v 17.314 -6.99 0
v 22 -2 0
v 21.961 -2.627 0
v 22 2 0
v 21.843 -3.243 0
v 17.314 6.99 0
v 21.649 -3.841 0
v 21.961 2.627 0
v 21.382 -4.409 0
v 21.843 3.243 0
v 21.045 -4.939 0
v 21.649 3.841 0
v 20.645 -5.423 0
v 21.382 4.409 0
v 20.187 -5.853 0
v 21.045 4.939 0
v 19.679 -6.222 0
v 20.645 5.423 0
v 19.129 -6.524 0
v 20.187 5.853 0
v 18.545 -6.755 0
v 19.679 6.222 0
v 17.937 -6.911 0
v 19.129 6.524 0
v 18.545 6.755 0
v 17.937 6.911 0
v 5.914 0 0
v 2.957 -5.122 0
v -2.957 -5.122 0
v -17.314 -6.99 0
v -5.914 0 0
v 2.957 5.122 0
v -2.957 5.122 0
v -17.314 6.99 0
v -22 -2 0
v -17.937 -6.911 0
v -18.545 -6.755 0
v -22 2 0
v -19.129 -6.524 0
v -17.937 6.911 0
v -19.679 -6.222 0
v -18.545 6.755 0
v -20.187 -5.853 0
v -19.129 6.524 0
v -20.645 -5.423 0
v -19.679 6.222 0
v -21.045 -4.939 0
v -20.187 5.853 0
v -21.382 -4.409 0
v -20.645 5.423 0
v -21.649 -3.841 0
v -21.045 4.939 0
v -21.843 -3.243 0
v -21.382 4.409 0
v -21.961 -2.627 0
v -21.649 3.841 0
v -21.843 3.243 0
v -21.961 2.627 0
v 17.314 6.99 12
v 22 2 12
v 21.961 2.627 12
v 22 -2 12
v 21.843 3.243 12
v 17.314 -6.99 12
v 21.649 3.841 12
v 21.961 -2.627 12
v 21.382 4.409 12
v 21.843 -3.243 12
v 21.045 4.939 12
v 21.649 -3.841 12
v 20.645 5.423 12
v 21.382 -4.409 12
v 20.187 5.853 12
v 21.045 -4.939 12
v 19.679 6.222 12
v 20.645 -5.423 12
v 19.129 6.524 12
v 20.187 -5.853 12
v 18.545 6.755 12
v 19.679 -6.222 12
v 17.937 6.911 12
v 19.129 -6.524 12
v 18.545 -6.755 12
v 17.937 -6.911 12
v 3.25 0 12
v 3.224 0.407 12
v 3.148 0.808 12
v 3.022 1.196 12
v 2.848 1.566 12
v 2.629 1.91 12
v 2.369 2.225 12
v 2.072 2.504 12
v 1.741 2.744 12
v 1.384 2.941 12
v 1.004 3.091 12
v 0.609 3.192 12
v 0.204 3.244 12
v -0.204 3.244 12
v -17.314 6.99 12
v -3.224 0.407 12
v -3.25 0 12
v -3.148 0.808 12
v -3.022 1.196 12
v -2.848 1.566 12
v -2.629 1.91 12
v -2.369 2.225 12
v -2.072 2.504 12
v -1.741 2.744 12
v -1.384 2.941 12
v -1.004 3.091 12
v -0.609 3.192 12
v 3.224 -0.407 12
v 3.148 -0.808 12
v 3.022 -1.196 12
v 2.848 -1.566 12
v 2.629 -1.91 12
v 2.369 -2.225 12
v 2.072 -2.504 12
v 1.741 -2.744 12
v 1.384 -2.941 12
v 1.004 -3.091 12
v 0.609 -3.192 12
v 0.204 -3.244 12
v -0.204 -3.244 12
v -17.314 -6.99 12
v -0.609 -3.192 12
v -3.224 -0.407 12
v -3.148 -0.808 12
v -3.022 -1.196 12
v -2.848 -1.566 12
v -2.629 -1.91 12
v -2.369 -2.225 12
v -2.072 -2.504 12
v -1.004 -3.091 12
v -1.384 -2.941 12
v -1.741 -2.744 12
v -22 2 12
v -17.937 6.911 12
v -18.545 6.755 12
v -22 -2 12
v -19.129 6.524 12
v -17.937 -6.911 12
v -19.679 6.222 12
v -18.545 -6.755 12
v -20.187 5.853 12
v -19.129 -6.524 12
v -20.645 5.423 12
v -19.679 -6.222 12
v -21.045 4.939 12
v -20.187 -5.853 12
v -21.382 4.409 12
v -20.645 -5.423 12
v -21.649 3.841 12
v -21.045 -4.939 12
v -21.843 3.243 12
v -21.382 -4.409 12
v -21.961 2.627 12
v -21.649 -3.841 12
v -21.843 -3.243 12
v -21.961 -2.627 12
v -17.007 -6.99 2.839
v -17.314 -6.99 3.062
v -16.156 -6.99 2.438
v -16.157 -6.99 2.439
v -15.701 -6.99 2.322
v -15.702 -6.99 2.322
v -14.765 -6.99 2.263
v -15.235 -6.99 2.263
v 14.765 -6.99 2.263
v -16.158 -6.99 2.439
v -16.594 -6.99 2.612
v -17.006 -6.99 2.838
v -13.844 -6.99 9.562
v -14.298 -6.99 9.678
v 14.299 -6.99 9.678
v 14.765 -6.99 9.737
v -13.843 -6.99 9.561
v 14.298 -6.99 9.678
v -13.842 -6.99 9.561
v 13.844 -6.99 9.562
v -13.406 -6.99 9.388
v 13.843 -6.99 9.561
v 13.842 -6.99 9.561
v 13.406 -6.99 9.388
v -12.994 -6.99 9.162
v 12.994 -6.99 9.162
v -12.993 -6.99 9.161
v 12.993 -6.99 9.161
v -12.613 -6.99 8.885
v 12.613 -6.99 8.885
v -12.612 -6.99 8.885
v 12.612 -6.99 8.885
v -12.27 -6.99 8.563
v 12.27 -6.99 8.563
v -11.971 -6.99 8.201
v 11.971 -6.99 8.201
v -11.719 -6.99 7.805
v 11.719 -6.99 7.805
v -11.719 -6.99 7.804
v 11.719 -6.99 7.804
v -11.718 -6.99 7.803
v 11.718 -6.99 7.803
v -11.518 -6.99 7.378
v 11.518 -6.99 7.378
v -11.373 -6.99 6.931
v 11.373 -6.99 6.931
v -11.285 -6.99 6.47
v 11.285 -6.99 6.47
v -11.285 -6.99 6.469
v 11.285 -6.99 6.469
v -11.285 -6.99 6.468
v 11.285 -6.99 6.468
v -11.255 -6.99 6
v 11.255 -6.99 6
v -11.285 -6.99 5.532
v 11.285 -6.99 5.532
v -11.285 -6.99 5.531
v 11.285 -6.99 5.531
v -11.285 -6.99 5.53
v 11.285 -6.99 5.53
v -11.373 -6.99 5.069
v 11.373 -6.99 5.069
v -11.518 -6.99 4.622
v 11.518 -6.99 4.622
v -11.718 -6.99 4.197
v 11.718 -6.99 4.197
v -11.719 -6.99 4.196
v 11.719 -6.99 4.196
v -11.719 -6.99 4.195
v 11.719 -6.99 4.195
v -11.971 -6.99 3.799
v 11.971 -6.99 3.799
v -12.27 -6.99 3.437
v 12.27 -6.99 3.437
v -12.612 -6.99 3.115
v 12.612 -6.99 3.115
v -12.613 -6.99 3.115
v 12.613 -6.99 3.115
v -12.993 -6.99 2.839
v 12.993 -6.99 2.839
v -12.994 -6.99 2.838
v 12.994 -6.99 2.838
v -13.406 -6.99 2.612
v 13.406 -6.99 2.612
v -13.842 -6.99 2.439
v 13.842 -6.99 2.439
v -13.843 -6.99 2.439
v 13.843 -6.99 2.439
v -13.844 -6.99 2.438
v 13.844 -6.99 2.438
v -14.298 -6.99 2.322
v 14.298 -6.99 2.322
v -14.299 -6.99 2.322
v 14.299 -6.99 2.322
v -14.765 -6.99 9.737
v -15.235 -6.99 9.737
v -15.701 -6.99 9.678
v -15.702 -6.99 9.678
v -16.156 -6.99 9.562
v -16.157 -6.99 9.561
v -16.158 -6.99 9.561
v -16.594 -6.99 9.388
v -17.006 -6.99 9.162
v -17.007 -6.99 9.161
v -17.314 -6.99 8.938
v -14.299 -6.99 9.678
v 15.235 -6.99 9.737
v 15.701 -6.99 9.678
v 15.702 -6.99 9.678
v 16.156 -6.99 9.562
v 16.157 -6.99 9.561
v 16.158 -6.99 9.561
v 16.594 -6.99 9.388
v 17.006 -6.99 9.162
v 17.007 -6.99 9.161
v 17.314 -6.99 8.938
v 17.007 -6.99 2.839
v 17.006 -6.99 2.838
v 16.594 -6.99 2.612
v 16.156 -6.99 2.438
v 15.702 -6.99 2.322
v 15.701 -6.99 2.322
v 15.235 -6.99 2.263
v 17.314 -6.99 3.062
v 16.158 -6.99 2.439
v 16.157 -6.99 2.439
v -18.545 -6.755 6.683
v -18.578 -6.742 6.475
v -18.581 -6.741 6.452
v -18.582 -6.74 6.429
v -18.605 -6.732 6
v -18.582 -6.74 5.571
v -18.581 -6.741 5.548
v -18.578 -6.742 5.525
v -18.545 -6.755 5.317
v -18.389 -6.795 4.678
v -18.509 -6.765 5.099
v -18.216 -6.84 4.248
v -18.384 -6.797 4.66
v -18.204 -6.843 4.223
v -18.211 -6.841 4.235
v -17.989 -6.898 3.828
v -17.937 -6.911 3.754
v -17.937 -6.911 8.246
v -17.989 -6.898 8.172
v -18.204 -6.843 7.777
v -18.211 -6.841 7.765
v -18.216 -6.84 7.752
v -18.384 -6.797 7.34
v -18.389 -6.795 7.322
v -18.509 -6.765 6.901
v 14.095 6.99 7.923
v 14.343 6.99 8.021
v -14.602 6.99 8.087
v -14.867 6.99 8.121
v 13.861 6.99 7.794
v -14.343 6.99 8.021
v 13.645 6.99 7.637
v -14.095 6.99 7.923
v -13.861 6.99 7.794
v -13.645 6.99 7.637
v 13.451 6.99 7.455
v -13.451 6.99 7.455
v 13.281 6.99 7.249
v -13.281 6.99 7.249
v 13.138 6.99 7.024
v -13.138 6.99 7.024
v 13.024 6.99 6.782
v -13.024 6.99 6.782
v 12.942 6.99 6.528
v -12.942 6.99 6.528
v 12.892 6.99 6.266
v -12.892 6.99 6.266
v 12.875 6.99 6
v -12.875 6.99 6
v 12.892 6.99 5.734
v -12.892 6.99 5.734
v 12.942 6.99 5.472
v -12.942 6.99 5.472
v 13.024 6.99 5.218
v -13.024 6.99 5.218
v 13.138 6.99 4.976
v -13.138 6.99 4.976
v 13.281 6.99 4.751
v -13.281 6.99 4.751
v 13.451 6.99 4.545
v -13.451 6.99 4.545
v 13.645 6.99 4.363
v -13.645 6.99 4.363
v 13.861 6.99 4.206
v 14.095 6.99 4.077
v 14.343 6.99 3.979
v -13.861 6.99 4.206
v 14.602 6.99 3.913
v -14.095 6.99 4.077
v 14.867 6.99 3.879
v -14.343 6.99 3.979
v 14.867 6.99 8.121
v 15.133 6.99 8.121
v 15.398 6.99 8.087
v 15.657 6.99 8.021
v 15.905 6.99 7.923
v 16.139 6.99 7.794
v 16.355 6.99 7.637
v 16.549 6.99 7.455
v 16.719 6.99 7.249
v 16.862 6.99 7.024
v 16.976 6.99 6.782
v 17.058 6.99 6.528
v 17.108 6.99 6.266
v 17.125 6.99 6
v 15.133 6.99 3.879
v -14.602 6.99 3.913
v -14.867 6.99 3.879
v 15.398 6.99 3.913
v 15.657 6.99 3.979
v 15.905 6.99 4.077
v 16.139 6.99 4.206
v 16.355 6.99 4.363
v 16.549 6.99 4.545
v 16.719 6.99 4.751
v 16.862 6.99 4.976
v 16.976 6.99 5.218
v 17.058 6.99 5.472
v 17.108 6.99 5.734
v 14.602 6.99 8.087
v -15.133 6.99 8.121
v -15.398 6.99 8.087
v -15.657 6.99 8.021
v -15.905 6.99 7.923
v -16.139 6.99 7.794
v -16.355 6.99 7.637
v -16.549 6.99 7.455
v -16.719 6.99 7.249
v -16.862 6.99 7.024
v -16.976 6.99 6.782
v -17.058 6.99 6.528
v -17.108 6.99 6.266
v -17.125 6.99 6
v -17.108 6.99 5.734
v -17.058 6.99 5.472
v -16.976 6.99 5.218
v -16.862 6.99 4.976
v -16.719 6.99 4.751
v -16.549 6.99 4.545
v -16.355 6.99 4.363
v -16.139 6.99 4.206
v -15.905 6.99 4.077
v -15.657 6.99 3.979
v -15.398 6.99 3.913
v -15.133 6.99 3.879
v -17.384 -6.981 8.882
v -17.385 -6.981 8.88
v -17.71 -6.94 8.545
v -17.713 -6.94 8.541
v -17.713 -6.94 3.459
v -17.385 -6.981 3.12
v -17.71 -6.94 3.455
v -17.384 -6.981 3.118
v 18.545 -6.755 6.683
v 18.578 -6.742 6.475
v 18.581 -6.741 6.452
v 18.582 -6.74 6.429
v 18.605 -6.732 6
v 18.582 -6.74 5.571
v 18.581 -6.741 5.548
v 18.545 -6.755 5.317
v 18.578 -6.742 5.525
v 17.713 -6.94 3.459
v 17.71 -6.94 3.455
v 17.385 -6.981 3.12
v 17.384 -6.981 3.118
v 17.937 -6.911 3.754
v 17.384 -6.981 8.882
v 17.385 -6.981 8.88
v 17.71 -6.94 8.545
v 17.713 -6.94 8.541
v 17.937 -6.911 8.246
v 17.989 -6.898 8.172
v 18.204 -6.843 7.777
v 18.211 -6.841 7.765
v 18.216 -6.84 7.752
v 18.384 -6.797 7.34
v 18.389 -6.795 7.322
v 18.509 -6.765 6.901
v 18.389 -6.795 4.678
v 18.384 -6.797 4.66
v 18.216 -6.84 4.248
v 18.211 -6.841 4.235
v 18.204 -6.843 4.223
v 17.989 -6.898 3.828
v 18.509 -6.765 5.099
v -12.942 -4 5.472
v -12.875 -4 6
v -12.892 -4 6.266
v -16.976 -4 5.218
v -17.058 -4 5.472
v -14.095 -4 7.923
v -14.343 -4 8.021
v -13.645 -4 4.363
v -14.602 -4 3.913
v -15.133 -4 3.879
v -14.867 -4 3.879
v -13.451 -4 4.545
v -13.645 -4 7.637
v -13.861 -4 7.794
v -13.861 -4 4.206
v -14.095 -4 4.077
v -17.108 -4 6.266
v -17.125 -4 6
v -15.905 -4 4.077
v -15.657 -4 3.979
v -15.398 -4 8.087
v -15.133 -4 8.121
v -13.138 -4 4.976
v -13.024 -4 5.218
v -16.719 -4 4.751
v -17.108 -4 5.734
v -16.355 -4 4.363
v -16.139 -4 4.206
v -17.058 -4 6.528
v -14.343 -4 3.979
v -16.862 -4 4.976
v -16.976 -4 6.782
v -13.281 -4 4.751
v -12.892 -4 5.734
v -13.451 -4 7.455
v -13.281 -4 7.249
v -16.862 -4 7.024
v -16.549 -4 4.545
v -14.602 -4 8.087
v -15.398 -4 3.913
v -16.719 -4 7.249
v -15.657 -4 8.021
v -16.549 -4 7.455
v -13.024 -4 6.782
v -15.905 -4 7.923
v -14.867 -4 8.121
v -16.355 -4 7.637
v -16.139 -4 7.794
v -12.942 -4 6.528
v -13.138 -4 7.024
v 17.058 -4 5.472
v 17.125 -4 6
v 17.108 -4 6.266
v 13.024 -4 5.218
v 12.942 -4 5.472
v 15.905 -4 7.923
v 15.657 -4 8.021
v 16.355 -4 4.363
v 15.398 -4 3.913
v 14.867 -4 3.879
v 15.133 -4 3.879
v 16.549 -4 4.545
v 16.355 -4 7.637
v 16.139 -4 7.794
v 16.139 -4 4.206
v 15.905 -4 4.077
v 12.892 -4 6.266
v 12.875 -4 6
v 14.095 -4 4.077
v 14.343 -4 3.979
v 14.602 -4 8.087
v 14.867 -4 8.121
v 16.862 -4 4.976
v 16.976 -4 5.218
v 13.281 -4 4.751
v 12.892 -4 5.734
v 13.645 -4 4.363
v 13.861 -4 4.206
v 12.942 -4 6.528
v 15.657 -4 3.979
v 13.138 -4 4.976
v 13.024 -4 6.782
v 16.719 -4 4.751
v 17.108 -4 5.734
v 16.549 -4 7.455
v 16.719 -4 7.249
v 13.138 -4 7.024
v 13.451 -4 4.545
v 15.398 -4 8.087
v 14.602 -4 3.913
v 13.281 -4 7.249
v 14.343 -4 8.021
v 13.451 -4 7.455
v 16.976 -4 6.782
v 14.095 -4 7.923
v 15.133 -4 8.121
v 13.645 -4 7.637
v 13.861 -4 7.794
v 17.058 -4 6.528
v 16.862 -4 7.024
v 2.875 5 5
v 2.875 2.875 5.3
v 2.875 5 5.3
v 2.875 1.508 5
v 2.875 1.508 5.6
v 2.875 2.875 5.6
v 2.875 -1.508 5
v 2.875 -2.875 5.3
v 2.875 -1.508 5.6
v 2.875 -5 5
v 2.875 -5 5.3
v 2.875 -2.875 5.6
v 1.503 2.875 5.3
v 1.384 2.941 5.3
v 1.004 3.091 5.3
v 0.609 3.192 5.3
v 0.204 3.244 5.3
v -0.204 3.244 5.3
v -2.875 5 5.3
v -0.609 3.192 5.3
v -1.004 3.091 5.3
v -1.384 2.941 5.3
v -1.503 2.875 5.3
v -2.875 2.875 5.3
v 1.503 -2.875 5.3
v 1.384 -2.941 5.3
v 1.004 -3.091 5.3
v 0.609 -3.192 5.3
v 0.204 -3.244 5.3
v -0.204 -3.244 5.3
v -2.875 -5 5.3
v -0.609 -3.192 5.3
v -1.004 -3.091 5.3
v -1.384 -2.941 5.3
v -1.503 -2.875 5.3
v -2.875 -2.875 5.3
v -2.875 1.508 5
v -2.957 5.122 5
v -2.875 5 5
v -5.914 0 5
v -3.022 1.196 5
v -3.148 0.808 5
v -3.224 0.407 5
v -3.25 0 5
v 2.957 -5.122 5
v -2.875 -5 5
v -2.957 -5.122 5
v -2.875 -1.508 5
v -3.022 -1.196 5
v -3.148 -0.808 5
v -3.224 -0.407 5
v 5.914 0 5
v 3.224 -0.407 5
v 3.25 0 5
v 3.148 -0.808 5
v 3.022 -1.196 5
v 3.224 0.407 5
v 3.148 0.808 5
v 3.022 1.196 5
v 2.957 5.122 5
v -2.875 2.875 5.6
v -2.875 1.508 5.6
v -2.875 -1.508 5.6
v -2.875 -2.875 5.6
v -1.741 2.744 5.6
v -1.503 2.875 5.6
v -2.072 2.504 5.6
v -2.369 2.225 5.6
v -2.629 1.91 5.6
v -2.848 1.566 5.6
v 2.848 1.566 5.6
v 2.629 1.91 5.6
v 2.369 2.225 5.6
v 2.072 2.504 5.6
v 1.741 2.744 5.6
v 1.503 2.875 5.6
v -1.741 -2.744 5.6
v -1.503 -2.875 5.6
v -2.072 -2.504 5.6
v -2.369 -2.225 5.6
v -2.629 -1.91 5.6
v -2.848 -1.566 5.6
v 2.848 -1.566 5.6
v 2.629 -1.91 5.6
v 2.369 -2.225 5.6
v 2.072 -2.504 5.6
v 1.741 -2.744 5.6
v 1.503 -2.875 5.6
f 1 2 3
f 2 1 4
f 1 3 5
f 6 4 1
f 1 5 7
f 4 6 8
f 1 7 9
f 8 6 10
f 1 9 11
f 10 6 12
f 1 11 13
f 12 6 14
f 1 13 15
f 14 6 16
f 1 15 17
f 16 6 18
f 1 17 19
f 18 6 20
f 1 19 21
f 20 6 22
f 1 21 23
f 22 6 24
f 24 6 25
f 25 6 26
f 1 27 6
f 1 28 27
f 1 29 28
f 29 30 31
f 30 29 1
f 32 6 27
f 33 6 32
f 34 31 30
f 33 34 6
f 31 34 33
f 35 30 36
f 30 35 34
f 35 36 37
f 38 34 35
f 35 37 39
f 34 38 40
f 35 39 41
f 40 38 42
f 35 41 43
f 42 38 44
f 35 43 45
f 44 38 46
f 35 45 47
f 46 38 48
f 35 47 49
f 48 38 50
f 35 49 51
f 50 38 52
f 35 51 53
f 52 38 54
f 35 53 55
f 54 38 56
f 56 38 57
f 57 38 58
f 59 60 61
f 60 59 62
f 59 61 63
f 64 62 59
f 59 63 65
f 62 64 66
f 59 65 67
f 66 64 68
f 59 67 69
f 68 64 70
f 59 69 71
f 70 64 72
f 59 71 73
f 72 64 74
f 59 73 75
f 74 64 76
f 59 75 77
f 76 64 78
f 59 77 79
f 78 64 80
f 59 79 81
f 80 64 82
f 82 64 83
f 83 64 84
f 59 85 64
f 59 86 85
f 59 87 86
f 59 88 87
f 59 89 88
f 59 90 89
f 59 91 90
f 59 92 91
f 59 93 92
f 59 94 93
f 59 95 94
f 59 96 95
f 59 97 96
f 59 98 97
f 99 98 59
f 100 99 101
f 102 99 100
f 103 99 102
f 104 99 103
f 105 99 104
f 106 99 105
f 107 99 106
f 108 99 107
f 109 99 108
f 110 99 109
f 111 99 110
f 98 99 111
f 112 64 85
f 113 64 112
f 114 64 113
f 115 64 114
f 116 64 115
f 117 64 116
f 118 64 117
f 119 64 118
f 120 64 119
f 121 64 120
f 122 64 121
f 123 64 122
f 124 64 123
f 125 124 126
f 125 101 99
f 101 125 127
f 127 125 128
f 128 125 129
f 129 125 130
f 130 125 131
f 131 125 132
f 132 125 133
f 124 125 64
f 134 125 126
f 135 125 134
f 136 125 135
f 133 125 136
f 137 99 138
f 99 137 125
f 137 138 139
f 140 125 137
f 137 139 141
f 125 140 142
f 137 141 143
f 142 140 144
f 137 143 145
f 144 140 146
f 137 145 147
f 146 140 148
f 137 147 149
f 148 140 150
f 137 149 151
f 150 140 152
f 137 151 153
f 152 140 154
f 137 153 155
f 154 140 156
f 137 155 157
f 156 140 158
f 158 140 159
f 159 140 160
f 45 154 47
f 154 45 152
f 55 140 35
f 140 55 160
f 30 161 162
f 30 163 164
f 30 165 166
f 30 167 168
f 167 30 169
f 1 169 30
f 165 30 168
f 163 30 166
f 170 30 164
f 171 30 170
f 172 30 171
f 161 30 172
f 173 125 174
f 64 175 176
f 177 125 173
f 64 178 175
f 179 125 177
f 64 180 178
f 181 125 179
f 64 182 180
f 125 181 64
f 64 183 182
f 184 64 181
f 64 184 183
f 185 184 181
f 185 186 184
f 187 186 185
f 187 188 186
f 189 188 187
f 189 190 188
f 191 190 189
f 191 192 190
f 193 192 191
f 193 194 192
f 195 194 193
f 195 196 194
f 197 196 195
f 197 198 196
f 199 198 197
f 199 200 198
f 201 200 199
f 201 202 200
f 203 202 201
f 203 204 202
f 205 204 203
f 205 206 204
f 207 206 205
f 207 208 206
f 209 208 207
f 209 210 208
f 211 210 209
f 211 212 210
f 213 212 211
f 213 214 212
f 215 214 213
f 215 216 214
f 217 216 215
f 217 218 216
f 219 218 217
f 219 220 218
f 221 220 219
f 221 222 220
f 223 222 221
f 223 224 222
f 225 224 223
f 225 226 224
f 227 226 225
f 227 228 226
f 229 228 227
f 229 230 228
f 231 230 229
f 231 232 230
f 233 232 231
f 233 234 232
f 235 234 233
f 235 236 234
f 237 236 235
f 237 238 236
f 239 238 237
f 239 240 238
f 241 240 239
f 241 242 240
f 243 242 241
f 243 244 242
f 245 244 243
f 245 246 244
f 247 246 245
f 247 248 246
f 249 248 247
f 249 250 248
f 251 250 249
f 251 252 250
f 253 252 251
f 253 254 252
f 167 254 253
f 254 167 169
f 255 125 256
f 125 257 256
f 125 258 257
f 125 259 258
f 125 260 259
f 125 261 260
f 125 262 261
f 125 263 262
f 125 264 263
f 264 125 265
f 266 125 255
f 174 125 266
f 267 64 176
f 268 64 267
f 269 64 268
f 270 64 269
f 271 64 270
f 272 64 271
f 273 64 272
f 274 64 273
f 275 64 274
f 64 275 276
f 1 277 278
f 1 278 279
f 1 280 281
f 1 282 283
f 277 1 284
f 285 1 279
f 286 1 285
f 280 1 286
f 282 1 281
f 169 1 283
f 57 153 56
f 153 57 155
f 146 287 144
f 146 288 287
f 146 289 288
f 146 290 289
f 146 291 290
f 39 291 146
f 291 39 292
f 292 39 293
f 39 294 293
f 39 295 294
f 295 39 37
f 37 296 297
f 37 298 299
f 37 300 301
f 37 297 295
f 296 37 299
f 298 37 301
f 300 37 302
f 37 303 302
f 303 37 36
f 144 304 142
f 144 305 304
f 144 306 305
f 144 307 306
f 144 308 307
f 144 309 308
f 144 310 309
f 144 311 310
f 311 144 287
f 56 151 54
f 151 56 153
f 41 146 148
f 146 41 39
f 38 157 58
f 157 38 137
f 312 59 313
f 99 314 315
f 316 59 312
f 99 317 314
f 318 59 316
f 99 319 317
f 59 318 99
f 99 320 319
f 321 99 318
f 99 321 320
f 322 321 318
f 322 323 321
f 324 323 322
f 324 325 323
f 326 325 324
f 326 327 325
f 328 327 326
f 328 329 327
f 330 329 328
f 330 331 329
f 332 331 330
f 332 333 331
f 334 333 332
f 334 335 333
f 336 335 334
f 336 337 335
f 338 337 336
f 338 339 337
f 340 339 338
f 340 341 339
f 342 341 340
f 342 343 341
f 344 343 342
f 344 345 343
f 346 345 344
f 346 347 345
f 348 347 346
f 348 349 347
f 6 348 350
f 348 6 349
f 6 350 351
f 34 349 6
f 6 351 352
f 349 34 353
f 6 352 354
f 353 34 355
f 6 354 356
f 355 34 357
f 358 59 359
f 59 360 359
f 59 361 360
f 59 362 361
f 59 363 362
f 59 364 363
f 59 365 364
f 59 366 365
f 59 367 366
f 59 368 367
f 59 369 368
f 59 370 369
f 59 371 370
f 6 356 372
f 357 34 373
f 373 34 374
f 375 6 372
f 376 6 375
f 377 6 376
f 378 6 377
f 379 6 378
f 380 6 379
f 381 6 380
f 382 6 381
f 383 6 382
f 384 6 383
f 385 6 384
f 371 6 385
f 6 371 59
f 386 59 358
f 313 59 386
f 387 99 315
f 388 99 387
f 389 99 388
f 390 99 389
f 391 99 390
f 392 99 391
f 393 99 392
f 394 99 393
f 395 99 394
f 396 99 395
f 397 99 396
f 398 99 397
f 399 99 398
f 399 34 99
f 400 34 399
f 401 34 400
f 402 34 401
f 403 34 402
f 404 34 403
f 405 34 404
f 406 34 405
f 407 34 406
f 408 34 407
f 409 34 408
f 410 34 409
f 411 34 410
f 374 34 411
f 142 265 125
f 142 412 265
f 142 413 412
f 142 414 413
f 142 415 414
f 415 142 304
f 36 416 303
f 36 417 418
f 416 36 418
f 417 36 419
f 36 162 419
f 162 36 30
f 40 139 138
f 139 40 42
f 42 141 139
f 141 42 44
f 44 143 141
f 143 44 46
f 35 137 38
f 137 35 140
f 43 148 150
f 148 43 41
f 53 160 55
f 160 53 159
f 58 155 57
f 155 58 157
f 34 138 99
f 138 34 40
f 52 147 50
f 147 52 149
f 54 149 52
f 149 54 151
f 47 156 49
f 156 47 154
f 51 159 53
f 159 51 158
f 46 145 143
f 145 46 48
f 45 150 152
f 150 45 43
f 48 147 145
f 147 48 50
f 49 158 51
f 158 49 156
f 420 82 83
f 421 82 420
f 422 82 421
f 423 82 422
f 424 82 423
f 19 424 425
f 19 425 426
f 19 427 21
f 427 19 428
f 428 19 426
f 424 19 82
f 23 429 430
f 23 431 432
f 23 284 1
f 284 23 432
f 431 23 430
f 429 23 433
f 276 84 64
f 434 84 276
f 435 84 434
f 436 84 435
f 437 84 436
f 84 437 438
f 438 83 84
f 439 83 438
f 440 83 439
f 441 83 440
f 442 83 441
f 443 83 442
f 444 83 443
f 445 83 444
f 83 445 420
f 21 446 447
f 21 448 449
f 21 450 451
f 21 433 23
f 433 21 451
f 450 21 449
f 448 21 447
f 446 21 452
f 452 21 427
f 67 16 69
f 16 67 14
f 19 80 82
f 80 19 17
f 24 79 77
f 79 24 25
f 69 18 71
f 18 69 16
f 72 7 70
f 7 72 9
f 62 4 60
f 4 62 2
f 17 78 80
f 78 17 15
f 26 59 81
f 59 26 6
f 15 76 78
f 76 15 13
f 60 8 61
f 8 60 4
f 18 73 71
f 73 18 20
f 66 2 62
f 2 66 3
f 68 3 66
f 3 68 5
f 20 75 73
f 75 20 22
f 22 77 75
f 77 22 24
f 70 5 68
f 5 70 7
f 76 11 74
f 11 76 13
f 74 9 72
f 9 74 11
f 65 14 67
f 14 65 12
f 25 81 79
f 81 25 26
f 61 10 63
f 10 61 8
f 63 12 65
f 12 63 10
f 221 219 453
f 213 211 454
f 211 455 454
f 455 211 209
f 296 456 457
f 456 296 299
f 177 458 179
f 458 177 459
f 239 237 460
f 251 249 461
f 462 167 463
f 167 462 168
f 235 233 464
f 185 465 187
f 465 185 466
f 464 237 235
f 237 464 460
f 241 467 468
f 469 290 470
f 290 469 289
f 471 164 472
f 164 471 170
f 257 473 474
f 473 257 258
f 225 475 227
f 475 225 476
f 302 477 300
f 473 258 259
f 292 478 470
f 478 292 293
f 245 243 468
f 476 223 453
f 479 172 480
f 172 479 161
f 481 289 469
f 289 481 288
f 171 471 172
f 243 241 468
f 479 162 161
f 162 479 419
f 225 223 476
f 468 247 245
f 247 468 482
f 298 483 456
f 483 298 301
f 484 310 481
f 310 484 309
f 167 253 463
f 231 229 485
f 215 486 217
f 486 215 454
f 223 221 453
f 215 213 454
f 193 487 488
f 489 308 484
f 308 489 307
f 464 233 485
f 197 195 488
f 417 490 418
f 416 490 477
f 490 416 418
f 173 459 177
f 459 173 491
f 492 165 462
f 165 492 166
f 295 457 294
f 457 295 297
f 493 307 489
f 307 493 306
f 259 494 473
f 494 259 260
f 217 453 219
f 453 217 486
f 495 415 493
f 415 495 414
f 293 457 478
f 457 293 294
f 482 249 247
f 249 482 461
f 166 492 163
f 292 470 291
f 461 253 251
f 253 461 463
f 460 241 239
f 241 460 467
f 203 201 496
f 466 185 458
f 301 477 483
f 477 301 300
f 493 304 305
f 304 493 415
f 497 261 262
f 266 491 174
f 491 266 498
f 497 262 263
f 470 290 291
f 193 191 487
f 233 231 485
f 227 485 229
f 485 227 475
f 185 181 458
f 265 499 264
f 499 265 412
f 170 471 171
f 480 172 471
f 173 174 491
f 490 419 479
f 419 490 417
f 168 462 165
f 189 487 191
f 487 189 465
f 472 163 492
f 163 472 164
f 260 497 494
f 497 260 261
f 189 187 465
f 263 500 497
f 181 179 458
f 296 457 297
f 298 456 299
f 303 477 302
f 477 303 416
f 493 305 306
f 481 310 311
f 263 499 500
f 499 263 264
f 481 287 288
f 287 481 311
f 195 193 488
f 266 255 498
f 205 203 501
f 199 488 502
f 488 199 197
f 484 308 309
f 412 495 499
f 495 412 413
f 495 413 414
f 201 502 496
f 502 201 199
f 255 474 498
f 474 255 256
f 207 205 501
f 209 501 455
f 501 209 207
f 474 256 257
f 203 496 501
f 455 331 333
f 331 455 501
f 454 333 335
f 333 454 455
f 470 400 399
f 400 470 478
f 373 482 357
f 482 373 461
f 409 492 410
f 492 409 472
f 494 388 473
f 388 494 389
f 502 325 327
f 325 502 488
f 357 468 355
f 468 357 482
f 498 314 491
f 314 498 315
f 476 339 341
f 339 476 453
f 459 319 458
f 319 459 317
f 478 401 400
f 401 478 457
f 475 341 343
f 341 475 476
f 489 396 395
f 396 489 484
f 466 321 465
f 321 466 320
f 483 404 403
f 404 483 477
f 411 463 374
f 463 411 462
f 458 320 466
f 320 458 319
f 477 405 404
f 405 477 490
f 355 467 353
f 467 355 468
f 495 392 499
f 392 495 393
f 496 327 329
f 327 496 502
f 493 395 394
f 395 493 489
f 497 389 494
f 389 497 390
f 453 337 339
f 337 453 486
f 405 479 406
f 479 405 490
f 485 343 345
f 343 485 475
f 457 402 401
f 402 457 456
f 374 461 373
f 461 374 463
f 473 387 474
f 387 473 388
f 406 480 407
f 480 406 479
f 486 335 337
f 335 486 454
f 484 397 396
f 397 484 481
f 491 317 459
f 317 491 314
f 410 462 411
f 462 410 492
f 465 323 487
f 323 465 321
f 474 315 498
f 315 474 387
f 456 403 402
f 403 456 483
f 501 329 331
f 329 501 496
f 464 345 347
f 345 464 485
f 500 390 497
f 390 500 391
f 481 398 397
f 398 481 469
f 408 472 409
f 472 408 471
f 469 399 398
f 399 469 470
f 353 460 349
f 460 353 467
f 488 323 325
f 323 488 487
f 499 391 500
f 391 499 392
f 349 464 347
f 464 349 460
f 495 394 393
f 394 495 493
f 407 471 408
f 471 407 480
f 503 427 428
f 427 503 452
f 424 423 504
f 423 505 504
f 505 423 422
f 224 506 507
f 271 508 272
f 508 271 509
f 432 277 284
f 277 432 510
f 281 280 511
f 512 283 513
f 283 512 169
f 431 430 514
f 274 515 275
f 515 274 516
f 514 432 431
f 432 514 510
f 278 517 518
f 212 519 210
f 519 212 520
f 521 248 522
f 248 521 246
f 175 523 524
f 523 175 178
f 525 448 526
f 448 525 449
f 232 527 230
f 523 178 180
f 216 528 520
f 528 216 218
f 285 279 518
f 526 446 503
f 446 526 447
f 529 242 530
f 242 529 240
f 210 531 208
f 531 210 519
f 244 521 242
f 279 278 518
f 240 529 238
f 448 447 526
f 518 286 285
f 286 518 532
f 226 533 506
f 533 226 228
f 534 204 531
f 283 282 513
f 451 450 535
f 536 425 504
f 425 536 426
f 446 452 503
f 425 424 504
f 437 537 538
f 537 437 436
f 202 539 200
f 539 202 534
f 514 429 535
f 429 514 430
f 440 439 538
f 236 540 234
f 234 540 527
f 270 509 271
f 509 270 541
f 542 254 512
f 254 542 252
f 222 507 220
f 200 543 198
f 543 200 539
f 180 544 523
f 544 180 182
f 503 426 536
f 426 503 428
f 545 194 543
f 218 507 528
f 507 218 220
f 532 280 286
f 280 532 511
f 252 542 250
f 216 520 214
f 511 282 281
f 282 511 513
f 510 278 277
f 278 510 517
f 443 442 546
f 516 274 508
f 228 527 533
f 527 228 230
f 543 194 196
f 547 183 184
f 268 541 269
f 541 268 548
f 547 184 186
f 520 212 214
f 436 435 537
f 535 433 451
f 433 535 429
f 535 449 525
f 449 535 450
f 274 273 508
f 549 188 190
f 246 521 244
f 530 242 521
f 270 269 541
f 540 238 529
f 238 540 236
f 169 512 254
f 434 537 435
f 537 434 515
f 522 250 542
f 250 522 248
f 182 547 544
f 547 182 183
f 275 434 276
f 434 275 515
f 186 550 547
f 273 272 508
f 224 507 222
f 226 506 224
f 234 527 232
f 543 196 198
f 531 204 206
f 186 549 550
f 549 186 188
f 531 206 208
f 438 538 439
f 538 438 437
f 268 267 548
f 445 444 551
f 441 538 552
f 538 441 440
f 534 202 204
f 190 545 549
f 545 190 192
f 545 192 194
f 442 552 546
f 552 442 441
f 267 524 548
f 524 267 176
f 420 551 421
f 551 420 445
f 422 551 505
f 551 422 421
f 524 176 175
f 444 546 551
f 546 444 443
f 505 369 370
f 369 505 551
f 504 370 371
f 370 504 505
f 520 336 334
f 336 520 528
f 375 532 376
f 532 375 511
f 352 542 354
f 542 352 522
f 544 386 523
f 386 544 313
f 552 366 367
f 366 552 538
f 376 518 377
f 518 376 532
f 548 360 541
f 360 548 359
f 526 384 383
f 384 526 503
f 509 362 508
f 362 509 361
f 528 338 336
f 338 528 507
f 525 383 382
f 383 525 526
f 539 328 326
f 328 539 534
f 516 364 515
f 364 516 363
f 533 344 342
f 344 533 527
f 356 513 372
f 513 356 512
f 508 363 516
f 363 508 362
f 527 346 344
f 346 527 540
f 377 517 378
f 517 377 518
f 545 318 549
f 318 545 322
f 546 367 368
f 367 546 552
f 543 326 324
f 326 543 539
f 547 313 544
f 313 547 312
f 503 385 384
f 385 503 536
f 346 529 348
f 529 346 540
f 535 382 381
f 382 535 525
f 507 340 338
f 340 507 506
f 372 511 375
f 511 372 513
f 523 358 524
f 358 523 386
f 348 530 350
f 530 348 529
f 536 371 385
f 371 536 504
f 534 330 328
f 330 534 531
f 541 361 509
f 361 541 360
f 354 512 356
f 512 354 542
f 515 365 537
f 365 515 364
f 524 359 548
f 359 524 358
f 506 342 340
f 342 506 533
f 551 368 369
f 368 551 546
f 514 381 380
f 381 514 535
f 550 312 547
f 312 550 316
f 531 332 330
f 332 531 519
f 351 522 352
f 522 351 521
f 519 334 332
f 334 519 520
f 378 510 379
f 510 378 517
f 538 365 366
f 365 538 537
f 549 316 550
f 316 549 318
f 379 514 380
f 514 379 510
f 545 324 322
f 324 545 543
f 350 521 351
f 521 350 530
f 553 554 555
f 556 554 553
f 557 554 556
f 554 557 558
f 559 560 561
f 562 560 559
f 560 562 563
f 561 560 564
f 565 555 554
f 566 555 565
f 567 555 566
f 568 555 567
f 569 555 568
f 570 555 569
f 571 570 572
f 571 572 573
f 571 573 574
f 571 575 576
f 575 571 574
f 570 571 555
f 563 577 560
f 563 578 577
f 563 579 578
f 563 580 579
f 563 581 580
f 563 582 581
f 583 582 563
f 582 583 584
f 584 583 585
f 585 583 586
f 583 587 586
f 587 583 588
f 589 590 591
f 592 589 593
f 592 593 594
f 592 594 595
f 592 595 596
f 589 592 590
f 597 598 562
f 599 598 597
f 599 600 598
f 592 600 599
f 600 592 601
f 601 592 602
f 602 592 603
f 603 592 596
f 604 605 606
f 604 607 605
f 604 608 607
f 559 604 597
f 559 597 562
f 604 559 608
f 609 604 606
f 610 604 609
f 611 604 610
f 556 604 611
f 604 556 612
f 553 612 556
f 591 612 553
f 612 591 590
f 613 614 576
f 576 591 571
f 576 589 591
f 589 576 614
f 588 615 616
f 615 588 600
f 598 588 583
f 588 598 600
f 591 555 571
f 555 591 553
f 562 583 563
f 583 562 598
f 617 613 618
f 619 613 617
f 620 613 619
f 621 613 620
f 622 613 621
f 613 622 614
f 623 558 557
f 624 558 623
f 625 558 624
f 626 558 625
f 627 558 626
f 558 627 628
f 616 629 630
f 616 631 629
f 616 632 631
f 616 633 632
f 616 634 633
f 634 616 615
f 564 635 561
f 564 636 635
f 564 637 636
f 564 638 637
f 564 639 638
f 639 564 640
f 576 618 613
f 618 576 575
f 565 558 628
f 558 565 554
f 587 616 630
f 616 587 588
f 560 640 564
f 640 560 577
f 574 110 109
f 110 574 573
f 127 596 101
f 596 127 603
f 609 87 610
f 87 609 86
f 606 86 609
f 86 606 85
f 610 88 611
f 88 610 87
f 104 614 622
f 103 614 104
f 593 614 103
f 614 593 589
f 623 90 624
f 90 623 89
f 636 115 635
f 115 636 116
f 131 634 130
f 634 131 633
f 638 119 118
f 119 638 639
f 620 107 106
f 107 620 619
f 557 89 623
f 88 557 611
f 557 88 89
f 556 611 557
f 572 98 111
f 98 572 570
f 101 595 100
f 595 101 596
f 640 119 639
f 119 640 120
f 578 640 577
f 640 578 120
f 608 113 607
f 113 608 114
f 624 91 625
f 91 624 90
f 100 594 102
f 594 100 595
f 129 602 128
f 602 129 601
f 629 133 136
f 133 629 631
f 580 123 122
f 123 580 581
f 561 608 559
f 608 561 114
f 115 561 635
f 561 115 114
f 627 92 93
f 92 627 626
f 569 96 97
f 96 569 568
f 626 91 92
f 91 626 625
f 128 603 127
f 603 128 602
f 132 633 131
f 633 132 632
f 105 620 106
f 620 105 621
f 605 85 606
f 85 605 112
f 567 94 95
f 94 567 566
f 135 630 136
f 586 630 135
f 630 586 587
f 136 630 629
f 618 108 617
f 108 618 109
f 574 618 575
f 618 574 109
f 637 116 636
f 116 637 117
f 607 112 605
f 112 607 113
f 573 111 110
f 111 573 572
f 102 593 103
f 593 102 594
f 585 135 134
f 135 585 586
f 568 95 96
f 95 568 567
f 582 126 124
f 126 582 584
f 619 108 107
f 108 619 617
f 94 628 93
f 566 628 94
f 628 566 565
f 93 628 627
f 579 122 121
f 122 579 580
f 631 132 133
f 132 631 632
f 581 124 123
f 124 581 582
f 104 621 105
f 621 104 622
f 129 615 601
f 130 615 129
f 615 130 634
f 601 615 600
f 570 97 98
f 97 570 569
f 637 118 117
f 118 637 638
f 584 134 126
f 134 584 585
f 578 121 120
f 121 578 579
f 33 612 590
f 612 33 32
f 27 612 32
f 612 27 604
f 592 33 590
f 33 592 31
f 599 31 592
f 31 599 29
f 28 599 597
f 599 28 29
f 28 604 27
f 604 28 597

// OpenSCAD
$fn = 50;


difference() {
	union() {
		cylinder(h = 12, r = 7.0000000000);
		translate(v = [-7.5000000000, 0.0000000000, 0]) {
			hull() {
				translate(v = [-9.5000000000, 2.0000000000, 0]) {
					cylinder(h = 12, r = 5);
				}
				translate(v = [9.5000000000, 2.0000000000, 0]) {
					cylinder(h = 12, r = 5);
				}
				translate(v = [-9.5000000000, -2.0000000000, 0]) {
					cylinder(h = 12, r = 5);
				}
				translate(v = [9.5000000000, -2.0000000000, 0]) {
					cylinder(h = 12, r = 5);
				}
			}
		}
		translate(v = [-7.5000000000, 0.0000000000, 0]) {
			hull() {
				translate(v = [-9.5000000000, 2.0000000000, 0]) {
					cylinder(h = 12, r = 5);
				}
				translate(v = [9.5000000000, 2.0000000000, 0]) {
					cylinder(h = 12, r = 5);
				}
				translate(v = [-9.5000000000, -2.0000000000, 0]) {
					cylinder(h = 12, r = 5);
				}
				translate(v = [9.5000000000, -2.0000000000, 0]) {
					cylinder(h = 12, r = 5);
				}
			}
		}
		translate(v = [7.5000000000, 0.0000000000, 0]) {
			hull() {
				translate(v = [-9.5000000000, 2.0000000000, 0]) {
					cylinder(h = 12, r = 5);
				}
				translate(v = [9.5000000000, 2.0000000000, 0]) {
					cylinder(h = 12, r = 5);
				}
				translate(v = [-9.5000000000, -2.0000000000, 0]) {
					cylinder(h = 12, r = 5);
				}
				translate(v = [9.5000000000, -2.0000000000, 0]) {
					cylinder(h = 12, r = 5);
				}
			}
		}
		translate(v = [7.5000000000, 0.0000000000, 0]) {
			hull() {
				translate(v = [-9.5000000000, 2.0000000000, 0]) {
					cylinder(h = 12, r = 5);
				}
				translate(v = [9.5000000000, 2.0000000000, 0]) {
					cylinder(h = 12, r = 5);
				}
				translate(v = [-9.5000000000, -2.0000000000, 0]) {
					cylinder(h = 12, r = 5);
				}
				translate(v = [9.5000000000, -2.0000000000, 0]) {
					cylinder(h = 12, r = 5);
				}
			}
		}
	}
	union() {
		translate(v = [-15.0000000000, -7.0000000000, 6.0000000000]) {
			rotate(a = [90, 0, 0]) {
				difference() {
					union() {
						#translate(v = [0, 0, -14.0000000000]) {
							cylinder(h = 14, r = 2.0000000000);
						}
						#translate(v = [0, 0, -3]) {
							cylinder(h = 3, r1 = 2.1250000000, r2 = 3.7500000000);
						}
						#translate(v = [0, 0, -14.0000000000]) {
							cylinder(h = 14, r = 2.1250000000);
						}
						#translate(v = [0, 0, -14.0000000000]) {
							cylinder(h = 14, r = 2.0000000000);
						}
					}
					union();
				}
			}
		}
		translate(v = [15.0000000000, -7.0000000000, 6.0000000000]) {
			rotate(a = [90, 0, 0]) {
				difference() {
					union() {
						#translate(v = [0, 0, -14.0000000000]) {
							cylinder(h = 14, r = 2.0000000000);
						}
						#translate(v = [0, 0, -3]) {
							cylinder(h = 3, r1 = 2.1250000000, r2 = 3.7500000000);
						}
						#translate(v = [0, 0, -14.0000000000]) {
							cylinder(h = 14, r = 2.1250000000);
						}
						#translate(v = [0, 0, -14.0000000000]) {
							cylinder(h = 14, r = 2.0000000000);
						}
					}
					union();
				}
			}
		}
		translate(v = [0.0000000000, 0.0000000000, 0]) {
			rotate(a = [0, 0, 0]) {
				difference() {
					union() {
						#translate(v = [-2.8750000000, -5.0000000000, -0.3000000000]) {
							cube(size = [5.7500000000, 10, 0.3000000000]);
						}
						#translate(v = [-2.8750000000, -2.8750000000, -0.6000000000]) {
							cube(size = [5.7500000000, 5.7500000000, 0.3000000000]);
						}
						#translate(v = [-2.8750000000, -5.0000000000, 5]) {
							cube(size = [5.7500000000, 10, 0.3000000000]);
						}
						#translate(v = [-2.8750000000, -2.8750000000, 5.3000000000]) {
							cube(size = [5.7500000000, 5.7500000000, 0.3000000000]);
						}
						#translate(v = [0, 0, -100.0000000000]) {
							cylinder(h = 200, r = 3.2500000000);
						}
						#linear_extrude(height = 5) {
							polygon(points = [[5.9142500000, 0.0000000000], [2.9571250000, 5.1218907443], [-2.9571250000, 5.1218907443], [-5.9142500000, 0.0000000000], [-2.9571250000, -5.1218907443], [2.9571250000, -5.1218907443]]);
						}
						#translate(v = [-2.8750000000, -5.0000000000, -0.3000000000]) {
							cube(size = [5.7500000000, 10, 0.3000000000]);
						}
						#translate(v = [-2.8750000000, -2.8750000000, -0.6000000000]) {
							cube(size = [5.7500000000, 5.7500000000, 0.3000000000]);
						}
						#translate(v = [-2.8750000000, -5.0000000000, 5]) {
							cube(size = [5.7500000000, 10, 0.3000000000]);
						}
						#translate(v = [-2.8750000000, -2.8750000000, 5.3000000000]) {
							cube(size = [5.7500000000, 5.7500000000, 0.3000000000]);
						}
						#translate(v = [0, 0, -100.0000000000]) {
							cylinder(h = 200, r = 3.2500000000);
						}
						#translate(v = [-2.8750000000, -5.0000000000, -0.3000000000]) {
							cube(size = [5.7500000000, 10, 0.3000000000]);
						}
						#translate(v = [-2.8750000000, -2.8750000000, -0.6000000000]) {
							cube(size = [5.7500000000, 5.7500000000, 0.3000000000]);
						}
						#translate(v = [-2.8750000000, -5.0000000000, 5]) {
							cube(size = [5.7500000000, 10, 0.3000000000]);
						}
						#translate(v = [-2.8750000000, -2.8750000000, 5.3000000000]) {
							cube(size = [5.7500000000, 5.7500000000, 0.3000000000]);
						}
						#translate(v = [0, 0, -100.0000000000]) {
							cylinder(h = 200, r = 3.2500000000);
						}
					}
					union();
				}
			}
		}
		translate(v = [0, 0, -100]) {
			cylinder(h = 200, r = 3.2500000000);
		}
		translate(v = [0, 0, -100]) {
			cylinder(h = 200, r = 1.8000000000);
		}
	}
}
